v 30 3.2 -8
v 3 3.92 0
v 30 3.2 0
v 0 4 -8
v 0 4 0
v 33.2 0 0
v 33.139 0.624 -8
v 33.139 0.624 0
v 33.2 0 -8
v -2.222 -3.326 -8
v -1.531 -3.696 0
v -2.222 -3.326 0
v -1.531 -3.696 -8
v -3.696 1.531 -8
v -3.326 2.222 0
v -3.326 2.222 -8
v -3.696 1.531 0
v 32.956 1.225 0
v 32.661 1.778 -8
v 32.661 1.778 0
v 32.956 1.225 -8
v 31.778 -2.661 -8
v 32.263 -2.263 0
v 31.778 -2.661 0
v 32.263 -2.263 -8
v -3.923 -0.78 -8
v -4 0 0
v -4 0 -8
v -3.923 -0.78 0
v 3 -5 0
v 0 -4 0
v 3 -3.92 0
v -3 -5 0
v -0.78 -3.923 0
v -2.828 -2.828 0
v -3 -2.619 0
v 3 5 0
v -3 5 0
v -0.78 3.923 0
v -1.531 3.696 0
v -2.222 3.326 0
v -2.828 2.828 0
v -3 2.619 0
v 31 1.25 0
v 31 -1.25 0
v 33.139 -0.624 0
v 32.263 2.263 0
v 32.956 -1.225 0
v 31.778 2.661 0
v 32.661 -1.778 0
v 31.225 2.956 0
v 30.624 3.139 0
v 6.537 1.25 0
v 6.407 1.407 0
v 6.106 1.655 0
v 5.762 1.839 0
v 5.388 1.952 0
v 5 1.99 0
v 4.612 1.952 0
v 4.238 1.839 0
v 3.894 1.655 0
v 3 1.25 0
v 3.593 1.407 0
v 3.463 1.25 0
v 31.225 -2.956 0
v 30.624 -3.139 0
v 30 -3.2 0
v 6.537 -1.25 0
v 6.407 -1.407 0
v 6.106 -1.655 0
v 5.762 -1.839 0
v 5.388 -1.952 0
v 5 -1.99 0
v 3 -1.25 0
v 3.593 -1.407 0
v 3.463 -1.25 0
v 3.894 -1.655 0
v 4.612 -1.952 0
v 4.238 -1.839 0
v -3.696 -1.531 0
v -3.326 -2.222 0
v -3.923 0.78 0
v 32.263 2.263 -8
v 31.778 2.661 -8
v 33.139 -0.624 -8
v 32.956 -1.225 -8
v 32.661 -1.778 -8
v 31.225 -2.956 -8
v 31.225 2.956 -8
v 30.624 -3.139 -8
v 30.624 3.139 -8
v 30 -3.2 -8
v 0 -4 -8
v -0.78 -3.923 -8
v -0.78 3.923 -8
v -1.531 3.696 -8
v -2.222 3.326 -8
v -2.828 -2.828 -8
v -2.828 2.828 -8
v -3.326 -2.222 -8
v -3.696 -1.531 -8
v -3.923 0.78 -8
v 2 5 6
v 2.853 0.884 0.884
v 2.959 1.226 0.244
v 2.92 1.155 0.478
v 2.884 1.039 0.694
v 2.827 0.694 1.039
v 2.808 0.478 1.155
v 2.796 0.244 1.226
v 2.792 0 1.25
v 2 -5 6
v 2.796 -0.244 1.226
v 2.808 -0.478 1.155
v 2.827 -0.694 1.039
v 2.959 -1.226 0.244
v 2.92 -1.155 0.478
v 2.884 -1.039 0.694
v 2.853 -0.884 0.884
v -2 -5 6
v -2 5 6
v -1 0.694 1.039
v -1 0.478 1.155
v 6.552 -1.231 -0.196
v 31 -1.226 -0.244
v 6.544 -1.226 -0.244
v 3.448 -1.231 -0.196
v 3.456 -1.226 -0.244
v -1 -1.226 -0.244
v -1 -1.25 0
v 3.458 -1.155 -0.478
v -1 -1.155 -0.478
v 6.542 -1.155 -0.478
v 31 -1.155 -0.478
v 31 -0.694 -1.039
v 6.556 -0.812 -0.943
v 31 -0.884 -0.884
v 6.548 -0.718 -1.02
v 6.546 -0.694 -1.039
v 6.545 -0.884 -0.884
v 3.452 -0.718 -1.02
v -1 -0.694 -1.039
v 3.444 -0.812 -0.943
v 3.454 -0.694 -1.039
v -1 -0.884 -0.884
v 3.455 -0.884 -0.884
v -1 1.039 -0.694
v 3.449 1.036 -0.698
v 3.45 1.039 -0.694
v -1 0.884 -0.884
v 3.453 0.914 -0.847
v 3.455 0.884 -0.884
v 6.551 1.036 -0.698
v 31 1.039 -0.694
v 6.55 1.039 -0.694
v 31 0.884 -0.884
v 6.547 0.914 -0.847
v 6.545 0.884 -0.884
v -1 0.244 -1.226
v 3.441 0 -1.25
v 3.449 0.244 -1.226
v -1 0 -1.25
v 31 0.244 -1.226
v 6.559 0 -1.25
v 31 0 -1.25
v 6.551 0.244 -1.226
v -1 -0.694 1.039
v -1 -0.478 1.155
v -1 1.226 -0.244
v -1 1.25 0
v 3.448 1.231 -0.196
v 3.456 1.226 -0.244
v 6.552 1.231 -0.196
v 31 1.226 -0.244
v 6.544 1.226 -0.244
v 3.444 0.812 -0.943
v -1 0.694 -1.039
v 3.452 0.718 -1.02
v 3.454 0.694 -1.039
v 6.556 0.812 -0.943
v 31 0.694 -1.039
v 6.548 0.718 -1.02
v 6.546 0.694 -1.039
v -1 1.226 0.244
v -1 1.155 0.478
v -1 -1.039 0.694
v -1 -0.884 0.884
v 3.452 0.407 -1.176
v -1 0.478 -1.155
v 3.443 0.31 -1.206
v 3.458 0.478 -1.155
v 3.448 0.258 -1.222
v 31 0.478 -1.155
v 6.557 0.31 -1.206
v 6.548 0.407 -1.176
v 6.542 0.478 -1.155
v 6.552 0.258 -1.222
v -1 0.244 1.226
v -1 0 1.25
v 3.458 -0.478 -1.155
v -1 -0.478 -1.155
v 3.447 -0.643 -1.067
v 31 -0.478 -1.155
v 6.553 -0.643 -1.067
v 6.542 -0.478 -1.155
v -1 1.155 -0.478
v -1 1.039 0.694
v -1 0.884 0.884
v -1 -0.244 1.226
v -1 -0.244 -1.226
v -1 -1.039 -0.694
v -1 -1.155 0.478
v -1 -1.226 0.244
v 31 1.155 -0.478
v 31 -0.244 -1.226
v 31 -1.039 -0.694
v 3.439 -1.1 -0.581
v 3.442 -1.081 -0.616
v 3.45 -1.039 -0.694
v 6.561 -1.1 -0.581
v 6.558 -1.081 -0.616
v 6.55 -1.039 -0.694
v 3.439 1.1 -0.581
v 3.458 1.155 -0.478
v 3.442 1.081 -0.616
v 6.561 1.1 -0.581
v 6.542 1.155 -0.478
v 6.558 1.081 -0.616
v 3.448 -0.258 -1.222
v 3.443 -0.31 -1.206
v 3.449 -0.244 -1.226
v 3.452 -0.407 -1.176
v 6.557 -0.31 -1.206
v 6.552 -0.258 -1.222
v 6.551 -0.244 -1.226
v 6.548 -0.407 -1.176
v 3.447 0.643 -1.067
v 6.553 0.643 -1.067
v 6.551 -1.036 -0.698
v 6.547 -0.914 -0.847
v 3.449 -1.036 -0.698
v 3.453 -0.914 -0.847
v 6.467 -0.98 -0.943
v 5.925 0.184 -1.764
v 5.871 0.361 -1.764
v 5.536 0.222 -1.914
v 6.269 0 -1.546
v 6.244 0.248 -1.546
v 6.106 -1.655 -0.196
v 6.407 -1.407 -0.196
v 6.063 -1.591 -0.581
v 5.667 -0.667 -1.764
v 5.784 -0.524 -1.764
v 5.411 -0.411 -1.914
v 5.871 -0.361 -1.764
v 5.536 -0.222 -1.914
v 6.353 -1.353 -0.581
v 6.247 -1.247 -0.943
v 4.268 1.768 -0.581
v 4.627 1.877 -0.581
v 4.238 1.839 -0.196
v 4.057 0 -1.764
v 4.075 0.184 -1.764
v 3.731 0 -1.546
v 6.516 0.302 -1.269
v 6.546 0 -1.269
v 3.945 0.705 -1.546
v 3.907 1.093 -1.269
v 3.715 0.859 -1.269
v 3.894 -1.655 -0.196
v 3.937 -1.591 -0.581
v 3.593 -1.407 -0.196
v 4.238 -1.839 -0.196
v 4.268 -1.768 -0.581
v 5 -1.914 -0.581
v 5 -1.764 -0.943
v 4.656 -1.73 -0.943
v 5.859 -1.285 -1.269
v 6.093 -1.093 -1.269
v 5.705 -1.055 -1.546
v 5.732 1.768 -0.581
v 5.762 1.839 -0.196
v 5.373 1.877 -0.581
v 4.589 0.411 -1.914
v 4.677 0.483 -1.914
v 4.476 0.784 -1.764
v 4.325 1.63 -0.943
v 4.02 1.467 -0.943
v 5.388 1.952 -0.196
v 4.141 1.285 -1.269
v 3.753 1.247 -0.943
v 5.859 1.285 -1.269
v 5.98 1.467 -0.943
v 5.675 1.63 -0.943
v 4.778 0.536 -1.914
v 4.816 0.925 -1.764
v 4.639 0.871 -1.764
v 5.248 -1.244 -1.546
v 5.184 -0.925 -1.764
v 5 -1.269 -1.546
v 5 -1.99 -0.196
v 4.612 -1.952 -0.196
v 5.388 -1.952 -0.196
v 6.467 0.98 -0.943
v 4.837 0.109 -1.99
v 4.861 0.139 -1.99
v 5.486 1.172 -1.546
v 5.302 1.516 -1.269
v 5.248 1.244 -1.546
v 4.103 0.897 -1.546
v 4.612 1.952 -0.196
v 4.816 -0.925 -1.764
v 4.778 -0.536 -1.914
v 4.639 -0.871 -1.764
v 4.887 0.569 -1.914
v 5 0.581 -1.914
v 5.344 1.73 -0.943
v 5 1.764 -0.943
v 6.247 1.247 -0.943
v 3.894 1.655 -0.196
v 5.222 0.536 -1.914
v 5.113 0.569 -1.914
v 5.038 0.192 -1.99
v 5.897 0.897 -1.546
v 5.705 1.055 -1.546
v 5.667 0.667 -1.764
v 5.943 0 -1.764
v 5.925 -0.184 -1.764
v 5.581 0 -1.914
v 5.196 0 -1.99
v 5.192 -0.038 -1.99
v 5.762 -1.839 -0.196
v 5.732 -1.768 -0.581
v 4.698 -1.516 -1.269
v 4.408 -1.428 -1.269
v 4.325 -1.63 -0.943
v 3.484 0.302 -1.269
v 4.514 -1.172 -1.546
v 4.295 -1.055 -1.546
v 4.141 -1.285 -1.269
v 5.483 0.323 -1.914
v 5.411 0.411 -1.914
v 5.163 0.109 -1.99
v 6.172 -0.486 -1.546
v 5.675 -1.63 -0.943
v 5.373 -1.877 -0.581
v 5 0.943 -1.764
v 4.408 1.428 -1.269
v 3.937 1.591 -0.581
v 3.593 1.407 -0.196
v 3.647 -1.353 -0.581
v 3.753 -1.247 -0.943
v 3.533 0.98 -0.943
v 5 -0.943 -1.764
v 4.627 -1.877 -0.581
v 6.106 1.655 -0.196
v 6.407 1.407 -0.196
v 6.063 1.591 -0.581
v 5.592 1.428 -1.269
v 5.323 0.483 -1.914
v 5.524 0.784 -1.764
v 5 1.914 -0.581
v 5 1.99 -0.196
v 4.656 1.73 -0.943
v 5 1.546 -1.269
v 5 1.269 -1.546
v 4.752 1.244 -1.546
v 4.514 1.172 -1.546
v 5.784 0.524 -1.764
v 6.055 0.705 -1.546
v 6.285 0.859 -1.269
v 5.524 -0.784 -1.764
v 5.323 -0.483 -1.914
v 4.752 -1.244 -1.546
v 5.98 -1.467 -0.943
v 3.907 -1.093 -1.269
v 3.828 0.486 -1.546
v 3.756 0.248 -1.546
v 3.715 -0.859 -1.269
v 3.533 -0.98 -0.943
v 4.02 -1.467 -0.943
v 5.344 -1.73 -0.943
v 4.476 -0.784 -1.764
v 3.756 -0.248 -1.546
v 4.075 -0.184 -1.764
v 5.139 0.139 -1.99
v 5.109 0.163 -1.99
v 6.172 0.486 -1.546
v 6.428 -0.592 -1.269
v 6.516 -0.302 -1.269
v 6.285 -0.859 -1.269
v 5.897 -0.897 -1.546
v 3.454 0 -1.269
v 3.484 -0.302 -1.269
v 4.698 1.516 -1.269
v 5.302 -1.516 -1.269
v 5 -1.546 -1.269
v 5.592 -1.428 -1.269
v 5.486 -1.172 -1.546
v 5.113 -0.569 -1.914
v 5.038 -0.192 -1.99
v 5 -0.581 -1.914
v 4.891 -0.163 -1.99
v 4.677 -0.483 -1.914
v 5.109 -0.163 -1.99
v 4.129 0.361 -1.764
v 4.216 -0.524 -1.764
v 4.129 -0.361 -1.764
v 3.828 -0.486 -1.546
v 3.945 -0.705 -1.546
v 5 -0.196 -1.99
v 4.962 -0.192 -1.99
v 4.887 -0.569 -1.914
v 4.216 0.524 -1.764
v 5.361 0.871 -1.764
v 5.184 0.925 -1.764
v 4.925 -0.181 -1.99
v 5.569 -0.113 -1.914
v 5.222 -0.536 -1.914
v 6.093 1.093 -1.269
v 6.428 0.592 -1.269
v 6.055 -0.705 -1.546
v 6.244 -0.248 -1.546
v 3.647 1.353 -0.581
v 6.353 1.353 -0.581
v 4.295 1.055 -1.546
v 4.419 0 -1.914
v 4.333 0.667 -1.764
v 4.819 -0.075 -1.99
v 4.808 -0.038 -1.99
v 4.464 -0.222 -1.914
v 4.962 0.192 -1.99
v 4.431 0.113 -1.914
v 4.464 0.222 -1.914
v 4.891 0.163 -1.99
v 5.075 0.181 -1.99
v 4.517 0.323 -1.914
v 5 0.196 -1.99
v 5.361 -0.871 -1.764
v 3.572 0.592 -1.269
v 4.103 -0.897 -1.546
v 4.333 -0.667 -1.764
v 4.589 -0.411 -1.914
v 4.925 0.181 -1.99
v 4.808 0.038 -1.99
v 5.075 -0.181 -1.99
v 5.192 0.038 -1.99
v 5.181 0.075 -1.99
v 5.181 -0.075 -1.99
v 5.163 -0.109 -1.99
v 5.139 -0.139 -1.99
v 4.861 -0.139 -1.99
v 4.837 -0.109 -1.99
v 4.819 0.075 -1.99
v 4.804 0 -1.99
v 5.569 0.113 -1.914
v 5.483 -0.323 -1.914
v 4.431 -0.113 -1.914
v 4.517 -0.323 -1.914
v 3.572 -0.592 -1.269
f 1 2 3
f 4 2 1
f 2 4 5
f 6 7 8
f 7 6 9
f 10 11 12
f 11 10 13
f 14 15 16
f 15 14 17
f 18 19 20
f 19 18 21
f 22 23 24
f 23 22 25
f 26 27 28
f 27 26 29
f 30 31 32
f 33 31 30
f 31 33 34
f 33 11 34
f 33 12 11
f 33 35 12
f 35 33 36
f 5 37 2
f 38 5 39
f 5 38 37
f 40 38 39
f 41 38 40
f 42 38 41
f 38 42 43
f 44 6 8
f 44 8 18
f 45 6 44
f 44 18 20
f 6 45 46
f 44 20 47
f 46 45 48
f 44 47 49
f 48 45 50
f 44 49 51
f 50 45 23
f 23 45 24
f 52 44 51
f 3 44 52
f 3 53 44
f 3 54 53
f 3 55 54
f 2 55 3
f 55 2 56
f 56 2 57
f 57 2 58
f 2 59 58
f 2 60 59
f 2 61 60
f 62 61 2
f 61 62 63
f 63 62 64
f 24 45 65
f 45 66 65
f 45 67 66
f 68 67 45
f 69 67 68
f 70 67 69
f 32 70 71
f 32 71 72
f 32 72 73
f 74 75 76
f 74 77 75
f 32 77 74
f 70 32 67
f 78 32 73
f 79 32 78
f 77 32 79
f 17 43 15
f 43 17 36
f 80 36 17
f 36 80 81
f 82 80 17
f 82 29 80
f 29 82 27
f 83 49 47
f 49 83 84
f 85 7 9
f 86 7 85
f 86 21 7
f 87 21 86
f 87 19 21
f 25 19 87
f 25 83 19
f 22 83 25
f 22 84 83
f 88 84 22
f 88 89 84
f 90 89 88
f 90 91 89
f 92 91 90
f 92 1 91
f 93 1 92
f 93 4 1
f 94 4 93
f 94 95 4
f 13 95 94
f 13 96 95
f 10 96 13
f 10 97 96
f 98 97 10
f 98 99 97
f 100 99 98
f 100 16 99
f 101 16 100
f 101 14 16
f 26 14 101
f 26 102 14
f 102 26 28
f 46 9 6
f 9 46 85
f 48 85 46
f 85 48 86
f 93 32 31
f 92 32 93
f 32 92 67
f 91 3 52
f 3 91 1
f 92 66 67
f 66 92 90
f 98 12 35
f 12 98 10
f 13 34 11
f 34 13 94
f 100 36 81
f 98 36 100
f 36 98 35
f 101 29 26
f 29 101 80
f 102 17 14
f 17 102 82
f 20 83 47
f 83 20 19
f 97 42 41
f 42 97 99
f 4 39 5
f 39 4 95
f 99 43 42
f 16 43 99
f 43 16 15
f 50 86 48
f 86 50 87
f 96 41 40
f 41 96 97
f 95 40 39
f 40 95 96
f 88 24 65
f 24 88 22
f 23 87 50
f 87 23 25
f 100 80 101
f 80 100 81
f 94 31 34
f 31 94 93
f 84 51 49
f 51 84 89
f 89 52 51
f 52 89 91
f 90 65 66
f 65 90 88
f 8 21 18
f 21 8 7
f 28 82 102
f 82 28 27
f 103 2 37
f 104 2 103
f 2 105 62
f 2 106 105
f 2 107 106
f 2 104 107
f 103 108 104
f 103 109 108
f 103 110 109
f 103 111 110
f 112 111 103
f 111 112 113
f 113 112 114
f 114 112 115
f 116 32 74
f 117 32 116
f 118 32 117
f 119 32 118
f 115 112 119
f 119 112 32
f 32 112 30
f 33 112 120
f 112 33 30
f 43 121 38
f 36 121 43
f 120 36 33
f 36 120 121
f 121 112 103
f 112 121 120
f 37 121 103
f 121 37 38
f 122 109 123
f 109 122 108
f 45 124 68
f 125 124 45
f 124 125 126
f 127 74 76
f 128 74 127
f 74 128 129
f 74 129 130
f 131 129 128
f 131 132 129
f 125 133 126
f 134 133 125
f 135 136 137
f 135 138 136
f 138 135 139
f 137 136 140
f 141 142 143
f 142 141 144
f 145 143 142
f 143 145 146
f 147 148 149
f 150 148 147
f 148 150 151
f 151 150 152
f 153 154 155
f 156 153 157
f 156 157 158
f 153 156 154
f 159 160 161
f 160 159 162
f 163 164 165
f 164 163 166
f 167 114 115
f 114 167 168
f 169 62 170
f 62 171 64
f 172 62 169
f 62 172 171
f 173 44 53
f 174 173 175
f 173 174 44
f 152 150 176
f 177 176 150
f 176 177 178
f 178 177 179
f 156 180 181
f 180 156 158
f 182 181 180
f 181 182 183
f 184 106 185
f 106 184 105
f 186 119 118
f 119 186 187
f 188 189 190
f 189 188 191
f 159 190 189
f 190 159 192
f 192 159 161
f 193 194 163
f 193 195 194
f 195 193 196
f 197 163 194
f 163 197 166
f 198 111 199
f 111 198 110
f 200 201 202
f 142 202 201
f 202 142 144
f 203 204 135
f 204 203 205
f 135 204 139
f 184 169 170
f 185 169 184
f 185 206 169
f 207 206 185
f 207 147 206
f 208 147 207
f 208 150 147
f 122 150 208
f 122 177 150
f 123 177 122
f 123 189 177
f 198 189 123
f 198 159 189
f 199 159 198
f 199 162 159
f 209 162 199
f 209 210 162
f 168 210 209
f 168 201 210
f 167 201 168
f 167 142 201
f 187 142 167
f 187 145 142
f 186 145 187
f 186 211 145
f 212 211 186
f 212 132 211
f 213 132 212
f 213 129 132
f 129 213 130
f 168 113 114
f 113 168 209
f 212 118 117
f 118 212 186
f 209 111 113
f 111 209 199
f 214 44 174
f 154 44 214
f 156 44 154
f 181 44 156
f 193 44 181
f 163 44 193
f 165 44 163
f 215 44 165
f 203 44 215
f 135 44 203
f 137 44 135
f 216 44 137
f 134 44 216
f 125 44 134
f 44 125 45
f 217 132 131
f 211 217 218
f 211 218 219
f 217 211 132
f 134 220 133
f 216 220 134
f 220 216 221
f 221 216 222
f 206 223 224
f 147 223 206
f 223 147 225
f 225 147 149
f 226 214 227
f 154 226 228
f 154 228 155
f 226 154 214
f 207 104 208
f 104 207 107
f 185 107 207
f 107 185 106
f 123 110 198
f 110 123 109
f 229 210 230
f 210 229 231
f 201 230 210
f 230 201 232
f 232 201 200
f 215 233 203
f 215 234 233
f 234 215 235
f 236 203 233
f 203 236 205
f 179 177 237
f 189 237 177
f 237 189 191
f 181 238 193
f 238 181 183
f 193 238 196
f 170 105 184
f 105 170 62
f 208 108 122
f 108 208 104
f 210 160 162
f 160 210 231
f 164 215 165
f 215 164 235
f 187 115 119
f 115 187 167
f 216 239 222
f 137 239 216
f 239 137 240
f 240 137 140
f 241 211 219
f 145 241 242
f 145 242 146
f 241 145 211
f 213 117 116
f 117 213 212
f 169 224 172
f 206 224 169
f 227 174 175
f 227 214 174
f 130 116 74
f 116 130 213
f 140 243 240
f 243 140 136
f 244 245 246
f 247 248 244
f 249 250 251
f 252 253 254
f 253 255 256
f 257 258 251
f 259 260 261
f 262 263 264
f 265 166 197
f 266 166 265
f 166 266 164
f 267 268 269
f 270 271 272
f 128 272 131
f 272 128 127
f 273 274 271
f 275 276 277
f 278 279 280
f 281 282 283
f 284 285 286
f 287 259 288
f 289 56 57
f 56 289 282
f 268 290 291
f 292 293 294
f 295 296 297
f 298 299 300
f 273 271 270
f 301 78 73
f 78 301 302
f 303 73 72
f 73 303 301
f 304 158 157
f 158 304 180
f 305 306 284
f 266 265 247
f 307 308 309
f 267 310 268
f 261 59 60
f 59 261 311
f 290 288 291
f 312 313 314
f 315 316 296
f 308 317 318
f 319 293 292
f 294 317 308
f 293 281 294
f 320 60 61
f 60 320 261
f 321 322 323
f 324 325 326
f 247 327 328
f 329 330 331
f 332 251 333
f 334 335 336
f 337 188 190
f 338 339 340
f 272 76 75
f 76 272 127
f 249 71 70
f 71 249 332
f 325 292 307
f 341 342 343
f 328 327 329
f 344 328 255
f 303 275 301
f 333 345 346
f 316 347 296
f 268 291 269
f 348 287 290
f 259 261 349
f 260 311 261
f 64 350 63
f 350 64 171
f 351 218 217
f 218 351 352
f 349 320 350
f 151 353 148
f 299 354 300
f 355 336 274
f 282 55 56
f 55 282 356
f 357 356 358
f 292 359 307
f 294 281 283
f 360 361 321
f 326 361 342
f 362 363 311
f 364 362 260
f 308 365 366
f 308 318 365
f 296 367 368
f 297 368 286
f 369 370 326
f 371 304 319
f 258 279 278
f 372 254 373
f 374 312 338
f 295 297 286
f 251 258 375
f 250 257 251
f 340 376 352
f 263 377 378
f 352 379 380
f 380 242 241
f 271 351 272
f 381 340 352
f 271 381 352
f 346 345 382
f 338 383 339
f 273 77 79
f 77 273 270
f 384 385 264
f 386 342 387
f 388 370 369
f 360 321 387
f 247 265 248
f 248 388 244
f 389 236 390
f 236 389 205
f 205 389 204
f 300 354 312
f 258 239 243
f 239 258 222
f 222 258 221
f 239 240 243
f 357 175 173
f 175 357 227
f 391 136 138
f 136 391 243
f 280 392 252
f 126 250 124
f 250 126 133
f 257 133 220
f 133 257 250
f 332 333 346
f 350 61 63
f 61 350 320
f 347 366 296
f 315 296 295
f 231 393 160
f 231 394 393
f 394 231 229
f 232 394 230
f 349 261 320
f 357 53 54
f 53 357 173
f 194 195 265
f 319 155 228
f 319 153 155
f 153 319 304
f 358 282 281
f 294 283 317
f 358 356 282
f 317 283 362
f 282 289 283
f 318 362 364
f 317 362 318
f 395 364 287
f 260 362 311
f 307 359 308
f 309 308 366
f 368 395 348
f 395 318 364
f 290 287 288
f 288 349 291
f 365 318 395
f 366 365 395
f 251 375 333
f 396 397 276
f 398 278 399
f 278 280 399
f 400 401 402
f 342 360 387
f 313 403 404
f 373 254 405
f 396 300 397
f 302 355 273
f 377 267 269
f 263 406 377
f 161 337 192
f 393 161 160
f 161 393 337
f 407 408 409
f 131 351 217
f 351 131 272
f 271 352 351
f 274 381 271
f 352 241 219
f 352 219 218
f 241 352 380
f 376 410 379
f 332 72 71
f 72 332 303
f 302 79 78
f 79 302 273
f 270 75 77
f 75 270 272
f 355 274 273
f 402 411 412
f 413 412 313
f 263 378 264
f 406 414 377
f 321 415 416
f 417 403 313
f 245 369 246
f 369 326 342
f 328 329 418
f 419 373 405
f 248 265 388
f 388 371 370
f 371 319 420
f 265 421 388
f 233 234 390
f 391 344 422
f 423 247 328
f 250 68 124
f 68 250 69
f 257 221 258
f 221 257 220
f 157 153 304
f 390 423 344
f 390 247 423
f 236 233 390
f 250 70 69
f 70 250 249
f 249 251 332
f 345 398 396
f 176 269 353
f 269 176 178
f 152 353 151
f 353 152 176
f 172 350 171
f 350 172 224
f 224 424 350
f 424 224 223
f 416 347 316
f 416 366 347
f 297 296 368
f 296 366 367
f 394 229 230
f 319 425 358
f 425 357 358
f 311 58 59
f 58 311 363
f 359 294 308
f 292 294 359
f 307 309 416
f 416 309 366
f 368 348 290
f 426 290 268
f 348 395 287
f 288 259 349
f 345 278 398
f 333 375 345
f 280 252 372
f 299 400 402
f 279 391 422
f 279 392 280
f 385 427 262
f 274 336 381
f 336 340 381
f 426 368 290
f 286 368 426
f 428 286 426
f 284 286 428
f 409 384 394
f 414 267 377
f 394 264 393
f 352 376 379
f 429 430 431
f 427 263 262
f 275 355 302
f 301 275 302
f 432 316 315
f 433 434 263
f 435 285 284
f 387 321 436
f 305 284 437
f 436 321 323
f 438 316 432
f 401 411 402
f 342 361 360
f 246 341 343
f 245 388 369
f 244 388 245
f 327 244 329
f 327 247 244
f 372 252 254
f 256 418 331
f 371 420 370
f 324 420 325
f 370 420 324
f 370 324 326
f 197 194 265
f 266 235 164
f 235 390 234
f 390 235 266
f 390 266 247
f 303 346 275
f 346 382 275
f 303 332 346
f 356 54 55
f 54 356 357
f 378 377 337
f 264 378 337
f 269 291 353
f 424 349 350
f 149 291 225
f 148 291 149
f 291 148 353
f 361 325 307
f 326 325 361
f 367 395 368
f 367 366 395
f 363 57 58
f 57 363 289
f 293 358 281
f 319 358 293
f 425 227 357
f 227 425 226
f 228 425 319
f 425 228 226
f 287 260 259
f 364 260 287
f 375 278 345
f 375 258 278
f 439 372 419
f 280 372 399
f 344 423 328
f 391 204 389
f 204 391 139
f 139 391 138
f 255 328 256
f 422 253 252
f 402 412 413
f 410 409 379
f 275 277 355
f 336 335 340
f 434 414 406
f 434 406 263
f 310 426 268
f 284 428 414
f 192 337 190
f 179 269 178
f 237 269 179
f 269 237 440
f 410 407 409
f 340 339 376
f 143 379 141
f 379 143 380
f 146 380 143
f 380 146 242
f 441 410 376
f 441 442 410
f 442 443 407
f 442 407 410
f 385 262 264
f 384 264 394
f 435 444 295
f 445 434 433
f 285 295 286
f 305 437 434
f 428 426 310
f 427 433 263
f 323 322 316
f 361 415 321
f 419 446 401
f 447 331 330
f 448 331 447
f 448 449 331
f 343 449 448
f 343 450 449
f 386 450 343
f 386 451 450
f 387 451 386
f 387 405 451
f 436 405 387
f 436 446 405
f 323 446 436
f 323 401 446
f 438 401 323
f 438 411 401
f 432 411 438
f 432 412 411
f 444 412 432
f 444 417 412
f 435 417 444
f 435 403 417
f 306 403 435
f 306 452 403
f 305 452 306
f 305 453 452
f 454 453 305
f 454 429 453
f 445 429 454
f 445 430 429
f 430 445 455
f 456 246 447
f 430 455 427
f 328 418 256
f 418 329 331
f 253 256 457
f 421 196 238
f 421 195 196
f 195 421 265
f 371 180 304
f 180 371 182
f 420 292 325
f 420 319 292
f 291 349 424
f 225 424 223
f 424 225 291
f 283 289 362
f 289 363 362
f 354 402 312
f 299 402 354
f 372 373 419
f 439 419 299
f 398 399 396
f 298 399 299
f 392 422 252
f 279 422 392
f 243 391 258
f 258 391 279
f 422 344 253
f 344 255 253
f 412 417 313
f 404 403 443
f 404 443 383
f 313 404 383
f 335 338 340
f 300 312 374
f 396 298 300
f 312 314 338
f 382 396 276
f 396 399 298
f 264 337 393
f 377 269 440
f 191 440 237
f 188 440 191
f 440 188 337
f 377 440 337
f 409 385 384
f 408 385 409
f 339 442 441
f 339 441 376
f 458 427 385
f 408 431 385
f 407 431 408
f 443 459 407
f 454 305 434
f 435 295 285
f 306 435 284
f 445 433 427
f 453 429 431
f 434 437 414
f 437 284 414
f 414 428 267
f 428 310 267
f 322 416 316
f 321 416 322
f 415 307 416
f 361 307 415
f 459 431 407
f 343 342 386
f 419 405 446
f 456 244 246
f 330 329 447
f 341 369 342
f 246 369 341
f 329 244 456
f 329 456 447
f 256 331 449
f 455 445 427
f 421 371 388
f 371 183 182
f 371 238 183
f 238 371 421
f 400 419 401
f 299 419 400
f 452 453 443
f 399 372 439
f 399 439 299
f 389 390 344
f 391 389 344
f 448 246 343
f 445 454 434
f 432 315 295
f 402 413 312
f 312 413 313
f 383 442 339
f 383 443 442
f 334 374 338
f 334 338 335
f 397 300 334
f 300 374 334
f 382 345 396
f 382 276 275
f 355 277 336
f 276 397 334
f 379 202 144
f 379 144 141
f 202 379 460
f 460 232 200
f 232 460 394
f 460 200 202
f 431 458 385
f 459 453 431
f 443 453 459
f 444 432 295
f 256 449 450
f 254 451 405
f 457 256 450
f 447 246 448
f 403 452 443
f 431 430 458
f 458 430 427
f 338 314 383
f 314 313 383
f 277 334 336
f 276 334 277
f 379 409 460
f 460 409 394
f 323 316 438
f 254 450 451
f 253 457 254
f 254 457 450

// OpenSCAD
// COBRA-Snap Finger Segment - distal
// Dovetail slide joints, no glue needed

$fn = 32;

module finger_segment() {
    difference() {
        union() {
            // Main body
            hull() {
                translate([0, 0, -4])
                cylinder(h=8, d=8, center=true);
                
                translate([30.0, 0, -4])
                cylinder(h=8, d=6.4, center=true);
            }
            
            // Male dovetail (proximal end)
            translate([0, 0, 0])
            rotate([90, 0, 0])
            linear_extrude(height=10, center=true)
            polygon(points=[[-3, 0], [3, 0], [2, 6], [-2, 6]]);
        }
        
        // Female dovetail socket (distal end) - skip for distal
        
        
        // Tendon channel
        translate([15.0, 0, 0])
        rotate([0, 90, 0])
        cylinder(h=32.0, d=2.5, center=true);
        
        // Quick-connect socket for tendon
        translate([5, 0, 0])
        sphere(d=4);
    }
}

finger_segment();
